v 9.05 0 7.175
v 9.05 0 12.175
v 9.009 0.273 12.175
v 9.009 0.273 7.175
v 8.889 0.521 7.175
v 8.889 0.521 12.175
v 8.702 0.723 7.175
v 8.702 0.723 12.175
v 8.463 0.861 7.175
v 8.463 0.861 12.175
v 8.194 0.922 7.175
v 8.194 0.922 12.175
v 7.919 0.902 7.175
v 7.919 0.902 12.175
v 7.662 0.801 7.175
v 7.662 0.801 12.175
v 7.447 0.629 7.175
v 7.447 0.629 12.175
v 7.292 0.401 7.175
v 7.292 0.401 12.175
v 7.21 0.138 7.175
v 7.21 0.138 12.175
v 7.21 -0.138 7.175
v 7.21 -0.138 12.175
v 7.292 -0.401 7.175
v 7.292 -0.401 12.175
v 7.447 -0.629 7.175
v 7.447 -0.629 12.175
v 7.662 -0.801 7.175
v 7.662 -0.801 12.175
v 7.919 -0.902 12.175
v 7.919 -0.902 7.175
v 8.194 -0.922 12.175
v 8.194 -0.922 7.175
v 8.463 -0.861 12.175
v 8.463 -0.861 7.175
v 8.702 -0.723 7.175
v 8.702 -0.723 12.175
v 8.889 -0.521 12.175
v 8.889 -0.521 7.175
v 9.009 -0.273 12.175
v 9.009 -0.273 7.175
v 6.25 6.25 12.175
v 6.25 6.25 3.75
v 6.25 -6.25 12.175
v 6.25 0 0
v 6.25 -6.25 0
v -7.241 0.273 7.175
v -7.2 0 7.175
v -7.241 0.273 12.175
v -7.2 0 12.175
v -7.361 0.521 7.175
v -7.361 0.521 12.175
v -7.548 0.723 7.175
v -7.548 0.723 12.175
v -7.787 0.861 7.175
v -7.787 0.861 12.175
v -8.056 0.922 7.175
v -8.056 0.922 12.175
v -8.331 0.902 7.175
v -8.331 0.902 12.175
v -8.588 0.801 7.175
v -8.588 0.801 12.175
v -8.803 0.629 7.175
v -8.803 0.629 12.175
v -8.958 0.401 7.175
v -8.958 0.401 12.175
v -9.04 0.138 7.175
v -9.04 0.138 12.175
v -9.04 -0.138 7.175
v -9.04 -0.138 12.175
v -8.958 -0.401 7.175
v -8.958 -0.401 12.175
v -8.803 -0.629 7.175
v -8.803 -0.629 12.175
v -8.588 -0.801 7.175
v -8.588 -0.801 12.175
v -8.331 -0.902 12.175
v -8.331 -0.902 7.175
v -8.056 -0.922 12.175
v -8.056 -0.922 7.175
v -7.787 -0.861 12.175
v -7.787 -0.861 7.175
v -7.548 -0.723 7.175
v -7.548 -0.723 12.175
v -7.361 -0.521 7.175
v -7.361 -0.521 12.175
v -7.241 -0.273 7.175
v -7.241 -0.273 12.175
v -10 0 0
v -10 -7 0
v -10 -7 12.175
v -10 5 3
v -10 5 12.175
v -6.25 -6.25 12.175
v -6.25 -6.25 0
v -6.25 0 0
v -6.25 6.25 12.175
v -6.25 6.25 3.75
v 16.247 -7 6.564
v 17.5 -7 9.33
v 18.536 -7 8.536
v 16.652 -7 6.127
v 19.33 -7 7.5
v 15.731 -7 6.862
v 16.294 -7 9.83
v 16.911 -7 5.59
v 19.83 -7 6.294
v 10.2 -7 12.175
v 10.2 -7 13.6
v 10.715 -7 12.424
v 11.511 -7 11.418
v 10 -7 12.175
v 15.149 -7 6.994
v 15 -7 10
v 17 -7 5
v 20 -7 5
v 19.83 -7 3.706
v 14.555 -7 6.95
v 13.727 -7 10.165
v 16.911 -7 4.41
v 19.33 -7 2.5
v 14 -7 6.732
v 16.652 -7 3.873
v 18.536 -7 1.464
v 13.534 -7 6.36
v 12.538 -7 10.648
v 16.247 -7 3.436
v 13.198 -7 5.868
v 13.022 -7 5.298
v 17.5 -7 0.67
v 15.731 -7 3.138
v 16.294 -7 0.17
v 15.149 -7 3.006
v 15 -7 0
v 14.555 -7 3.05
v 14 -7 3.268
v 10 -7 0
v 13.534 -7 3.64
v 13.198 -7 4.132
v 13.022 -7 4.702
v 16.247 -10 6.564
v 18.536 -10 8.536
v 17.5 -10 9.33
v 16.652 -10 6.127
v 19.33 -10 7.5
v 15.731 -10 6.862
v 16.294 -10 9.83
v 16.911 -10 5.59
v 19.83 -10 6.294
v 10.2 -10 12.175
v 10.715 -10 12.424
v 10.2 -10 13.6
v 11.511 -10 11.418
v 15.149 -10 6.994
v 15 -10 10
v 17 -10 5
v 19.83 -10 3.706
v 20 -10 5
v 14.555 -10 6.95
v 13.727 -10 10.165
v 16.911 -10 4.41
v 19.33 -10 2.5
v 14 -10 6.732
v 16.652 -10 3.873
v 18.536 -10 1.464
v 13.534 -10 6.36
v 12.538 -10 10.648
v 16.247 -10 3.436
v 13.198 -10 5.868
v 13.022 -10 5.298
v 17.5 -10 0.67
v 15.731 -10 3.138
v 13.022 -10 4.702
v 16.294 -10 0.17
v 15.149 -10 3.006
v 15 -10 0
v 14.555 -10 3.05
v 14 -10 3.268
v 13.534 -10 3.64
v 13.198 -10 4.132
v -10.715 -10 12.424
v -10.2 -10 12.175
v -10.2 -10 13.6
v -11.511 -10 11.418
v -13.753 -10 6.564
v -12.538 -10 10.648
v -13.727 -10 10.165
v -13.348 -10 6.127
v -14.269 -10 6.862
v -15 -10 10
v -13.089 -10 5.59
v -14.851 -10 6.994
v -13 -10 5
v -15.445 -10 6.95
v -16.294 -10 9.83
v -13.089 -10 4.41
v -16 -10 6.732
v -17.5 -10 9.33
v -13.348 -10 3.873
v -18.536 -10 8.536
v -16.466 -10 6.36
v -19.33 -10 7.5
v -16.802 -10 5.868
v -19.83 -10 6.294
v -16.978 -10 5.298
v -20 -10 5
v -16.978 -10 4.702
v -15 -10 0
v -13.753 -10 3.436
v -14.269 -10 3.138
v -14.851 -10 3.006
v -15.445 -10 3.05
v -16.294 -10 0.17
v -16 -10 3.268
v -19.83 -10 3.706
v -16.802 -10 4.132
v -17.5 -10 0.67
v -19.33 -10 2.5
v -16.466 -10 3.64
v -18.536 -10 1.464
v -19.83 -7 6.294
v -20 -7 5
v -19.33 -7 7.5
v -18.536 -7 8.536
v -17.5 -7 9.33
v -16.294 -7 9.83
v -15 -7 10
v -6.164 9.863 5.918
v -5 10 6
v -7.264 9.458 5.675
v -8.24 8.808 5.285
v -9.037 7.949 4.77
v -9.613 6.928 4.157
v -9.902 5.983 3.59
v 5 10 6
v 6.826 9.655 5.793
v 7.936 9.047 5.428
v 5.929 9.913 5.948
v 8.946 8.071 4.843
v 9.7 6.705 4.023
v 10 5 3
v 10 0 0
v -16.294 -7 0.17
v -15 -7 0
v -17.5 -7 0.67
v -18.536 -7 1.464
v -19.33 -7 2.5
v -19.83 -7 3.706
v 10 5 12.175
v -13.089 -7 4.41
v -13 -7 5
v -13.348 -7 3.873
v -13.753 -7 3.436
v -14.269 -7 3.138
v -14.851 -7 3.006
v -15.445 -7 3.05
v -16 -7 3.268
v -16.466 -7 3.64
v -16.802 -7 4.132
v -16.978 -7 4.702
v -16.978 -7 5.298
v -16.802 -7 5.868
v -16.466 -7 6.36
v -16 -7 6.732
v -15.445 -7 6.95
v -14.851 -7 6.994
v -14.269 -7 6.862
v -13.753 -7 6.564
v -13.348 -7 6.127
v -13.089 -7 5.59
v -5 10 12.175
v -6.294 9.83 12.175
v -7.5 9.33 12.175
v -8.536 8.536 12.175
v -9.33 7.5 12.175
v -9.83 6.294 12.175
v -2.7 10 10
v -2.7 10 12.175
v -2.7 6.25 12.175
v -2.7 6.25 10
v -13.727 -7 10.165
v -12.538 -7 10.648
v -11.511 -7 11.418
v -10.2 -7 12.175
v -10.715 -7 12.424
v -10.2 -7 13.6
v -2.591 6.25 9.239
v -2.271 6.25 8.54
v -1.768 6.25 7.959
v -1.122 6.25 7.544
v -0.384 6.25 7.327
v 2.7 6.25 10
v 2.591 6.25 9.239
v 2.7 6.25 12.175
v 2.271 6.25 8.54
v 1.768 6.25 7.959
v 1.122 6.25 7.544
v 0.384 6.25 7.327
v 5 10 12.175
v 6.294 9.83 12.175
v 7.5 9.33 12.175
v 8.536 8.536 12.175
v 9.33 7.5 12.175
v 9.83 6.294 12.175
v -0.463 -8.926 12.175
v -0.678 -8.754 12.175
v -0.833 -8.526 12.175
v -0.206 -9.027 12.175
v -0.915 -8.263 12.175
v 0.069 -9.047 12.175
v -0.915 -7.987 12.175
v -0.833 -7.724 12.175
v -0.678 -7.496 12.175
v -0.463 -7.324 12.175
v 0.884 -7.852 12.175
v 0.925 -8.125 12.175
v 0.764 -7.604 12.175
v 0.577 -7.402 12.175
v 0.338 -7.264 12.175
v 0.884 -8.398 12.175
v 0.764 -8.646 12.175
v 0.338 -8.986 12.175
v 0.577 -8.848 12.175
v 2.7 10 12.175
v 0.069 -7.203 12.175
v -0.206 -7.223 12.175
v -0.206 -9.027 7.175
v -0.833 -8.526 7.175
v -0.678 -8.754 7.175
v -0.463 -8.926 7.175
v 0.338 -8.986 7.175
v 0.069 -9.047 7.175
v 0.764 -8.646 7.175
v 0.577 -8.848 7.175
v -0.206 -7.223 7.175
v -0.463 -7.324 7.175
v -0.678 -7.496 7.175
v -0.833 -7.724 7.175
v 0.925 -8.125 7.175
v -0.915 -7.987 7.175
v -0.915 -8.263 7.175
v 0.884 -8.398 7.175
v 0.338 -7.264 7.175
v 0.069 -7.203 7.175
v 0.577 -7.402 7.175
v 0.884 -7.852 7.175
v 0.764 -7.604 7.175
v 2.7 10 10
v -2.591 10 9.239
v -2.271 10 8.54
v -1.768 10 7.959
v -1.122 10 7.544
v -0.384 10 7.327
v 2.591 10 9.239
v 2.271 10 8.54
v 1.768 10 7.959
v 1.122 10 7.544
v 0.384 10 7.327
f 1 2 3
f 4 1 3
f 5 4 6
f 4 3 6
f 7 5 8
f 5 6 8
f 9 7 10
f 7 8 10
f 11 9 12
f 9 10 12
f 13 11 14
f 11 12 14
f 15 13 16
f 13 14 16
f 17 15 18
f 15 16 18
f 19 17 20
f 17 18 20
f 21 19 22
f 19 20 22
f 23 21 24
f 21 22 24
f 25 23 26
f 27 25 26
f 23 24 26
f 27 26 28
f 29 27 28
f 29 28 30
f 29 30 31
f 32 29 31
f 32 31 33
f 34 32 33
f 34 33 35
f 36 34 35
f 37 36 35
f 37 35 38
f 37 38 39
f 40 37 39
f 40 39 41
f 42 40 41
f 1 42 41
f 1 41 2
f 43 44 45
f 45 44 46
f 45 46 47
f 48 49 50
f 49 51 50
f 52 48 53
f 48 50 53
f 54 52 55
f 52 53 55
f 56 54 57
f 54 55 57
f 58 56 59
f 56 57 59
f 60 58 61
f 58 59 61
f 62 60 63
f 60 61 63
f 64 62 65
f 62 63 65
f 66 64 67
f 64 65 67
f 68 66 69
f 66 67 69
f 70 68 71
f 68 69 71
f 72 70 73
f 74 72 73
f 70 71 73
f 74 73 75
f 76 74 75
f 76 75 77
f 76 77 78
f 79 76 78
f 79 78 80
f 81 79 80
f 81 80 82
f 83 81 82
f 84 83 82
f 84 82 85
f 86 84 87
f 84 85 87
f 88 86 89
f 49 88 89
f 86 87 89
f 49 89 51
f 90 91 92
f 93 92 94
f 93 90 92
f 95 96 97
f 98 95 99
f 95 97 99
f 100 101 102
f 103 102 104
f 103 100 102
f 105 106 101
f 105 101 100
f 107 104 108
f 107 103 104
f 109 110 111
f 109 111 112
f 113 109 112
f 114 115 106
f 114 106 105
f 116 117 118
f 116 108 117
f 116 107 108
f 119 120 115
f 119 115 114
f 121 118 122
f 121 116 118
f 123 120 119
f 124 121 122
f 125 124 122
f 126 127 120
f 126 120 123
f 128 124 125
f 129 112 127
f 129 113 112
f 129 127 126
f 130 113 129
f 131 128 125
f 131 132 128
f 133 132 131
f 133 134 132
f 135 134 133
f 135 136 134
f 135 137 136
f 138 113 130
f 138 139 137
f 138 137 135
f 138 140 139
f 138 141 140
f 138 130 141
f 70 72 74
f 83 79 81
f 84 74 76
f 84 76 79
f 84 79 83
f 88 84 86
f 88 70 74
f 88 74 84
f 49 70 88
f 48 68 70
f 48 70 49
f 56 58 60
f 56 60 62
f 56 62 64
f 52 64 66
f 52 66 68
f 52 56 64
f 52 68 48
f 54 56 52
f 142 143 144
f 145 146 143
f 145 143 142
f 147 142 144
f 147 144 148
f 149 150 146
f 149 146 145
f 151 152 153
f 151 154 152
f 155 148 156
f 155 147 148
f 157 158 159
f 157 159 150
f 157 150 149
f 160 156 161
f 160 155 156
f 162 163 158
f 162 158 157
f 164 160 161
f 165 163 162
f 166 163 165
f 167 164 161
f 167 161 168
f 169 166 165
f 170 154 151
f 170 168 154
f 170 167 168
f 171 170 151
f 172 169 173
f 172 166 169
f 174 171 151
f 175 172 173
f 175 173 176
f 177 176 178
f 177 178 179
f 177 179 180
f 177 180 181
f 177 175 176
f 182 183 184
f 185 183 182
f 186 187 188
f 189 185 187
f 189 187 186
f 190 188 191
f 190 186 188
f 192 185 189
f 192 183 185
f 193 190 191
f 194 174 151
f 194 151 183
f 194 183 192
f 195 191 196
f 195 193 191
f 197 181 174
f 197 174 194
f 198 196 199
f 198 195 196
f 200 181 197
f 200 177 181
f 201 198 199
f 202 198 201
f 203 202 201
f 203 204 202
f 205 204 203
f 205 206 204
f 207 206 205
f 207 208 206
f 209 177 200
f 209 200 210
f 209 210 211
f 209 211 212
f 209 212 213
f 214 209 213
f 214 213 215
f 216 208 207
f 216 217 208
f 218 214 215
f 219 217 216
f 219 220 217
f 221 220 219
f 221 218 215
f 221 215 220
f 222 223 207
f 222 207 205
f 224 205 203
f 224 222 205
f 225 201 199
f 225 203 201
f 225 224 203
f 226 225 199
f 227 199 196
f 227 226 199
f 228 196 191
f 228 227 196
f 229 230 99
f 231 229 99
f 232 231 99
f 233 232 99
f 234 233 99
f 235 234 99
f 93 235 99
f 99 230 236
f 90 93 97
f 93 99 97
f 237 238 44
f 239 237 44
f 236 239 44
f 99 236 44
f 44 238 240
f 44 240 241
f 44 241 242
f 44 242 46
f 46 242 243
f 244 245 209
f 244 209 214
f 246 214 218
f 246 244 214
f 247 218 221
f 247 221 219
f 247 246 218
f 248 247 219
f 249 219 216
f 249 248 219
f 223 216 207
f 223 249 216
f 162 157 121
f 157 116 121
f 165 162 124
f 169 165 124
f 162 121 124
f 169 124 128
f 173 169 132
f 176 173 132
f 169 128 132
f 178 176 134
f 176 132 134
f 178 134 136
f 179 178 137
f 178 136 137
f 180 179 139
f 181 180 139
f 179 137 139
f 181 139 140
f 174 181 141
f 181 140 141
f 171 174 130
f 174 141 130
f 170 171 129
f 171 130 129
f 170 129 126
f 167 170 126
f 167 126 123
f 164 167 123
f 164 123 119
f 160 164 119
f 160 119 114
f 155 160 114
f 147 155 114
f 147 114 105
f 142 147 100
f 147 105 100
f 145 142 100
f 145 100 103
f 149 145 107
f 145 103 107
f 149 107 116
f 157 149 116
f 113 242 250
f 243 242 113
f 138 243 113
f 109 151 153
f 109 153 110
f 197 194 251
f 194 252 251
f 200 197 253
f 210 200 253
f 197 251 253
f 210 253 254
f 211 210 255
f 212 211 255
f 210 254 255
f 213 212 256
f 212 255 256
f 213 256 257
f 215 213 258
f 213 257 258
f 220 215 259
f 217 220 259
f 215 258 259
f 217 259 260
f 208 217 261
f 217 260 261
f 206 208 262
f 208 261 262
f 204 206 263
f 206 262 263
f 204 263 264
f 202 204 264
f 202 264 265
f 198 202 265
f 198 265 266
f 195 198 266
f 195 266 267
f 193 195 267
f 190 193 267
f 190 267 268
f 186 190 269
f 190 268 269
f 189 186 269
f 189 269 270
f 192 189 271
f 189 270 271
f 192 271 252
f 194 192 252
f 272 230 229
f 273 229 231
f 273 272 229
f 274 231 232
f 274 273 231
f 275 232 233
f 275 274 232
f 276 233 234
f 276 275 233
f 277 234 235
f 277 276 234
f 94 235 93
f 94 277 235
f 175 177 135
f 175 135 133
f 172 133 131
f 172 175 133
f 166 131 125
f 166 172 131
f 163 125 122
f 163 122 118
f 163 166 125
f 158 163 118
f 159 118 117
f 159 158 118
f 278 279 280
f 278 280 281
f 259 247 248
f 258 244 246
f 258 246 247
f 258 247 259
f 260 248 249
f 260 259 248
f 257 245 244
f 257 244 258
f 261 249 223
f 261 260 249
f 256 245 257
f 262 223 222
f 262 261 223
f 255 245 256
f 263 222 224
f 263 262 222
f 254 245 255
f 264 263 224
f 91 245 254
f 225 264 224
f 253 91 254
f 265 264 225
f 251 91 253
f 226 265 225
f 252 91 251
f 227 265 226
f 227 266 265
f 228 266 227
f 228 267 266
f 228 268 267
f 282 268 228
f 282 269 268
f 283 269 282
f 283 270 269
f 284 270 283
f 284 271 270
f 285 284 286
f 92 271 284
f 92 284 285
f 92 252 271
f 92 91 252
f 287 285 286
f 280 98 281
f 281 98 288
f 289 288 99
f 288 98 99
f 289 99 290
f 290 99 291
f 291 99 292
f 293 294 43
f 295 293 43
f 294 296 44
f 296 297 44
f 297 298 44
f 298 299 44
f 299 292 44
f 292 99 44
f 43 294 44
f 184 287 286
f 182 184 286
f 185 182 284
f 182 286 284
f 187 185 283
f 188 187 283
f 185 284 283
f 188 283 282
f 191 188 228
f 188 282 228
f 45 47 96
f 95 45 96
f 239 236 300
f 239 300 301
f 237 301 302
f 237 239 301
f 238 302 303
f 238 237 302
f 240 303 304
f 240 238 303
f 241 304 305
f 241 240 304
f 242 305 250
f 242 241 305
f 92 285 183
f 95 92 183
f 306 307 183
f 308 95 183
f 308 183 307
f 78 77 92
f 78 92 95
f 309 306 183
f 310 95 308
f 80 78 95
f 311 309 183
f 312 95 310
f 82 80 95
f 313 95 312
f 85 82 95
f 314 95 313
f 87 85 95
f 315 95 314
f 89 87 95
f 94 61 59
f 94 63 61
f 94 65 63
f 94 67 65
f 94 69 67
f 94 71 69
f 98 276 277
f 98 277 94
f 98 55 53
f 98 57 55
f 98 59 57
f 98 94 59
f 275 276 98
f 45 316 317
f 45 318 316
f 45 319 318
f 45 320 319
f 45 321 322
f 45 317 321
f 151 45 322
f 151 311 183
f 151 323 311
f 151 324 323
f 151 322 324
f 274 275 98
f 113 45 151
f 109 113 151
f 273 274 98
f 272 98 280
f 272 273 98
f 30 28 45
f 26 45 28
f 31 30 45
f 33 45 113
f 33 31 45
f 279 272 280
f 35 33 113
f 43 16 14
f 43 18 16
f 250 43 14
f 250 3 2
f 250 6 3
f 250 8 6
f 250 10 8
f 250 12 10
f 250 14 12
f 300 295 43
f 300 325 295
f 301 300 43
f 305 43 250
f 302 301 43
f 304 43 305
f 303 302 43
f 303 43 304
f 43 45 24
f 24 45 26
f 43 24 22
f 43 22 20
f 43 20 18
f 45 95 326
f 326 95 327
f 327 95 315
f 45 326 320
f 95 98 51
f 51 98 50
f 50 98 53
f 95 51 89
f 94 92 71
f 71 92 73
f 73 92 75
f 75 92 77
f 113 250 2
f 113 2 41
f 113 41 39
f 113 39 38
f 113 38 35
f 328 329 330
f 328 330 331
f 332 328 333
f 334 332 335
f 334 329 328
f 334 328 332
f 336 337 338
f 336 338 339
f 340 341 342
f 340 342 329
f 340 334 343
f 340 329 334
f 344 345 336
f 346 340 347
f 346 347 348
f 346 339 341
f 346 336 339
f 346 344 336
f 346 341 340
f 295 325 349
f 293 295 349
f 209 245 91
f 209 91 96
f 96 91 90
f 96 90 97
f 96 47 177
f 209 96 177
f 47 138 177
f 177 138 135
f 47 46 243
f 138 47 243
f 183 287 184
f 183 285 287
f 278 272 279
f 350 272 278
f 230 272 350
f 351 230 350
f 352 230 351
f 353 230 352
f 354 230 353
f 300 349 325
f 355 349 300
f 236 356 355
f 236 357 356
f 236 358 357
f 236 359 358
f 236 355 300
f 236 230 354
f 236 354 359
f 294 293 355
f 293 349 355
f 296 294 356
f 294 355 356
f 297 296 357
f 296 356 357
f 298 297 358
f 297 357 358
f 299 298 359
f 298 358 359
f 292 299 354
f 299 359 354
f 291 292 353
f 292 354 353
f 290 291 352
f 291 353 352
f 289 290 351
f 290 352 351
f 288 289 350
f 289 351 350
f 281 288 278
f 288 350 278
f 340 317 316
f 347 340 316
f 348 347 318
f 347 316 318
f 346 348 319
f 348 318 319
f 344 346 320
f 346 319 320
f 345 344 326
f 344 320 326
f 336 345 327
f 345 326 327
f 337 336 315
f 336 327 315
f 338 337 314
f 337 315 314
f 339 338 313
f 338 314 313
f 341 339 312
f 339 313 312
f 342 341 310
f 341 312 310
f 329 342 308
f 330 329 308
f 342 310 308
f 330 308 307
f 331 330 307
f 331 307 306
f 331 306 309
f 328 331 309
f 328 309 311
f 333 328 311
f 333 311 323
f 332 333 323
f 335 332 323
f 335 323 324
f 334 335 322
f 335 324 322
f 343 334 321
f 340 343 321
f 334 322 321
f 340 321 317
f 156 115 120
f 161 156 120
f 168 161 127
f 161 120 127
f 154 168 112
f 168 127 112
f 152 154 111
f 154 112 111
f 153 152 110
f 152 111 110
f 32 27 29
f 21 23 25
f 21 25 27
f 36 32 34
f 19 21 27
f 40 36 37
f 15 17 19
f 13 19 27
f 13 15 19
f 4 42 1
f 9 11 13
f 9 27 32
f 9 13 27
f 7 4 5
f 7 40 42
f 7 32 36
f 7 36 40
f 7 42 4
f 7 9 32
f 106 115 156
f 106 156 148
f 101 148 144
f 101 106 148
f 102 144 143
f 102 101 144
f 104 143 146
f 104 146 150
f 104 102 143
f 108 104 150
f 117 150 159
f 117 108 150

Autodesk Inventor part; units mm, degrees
ref_plane "YZ Plane" through (0, 0, 0) normal (1, 0, 0) x (0, 1, 0)
ref_plane "XZ Plane" through (0, 0, 0) normal (0, 1, 0) x (-1, 0, 0)
ref_plane "XY Plane" through (0, 0, 0) normal (0, 0, 1) x (1, 0, 0)
sketch "Sketch1" plane through (0, 0, 0) normal (0, 0, 1) x (1, 0, 0)
  line L0 (-6.25, 6.25) -> (6.25, 6.25)
  line L1 (6.25, 6.25) -> (6.25, -6.25)
  line L2 (6.25, -6.25) -> (-6.25, -6.25)
  line L3 (-6.25, -6.25) -> (-6.25, 6.25)
  line L4 (-10, 10) -> (10, 10)
  line L5 (10, 10) -> (10, -10)
  line L6 (10, -10) -> (-10, -10)
  line L7 (-10, -10) -> (-10, 10)
  line L8 (-10, 10) -> (10, -10) construction
  line L9 (10, 10) -> (-10, -10) construction
  dimension "d3" = 20
  dimension "d4" = 20
  dimension "d5" = 3.75
  dimension "d6" = 16.25
  dimension "d7" = 3.75
  dimension "d8" = 16.25
extrude "Extrusion1" add sketch "Sketch1" along normal blind 55
sketch "Sketch2" plane through (0, 0, 55) normal (0, 0, 1) x (1, 0, 0)
  line L0 (10, 10) -> (-10, 10) projected
  line L1 (-10, -10) -> (10, -10)
  line L2 (10, -10) -> (10, 10)
  line L3 (10, 10) -> (-10, 10)
  line L4 (-10, 10) -> (-10, -10)
  line L5 (-10, -10) -> (10, 10) construction
  line L6 (10, -10) -> (-10, 10) construction
  point P0 (0, 0)
extrude "Extrusion2" add sketch "Sketch2" along normal blind 3
sketch "Sketch3" plane through (0, 0, 55) normal (0, 0, -1) x (-1, 0, 0)
  circle A0 centre (0, 0) radius 4
  dimension "d13" = 8
extrude "Extrusion3" add sketch "Sketch3" along normal blind 14
sketch "Sketch4" plane through (10, -10, 0) normal (1, 0, 0) x (0, 0, -1)
  line L0 (0, 0) -> (-58, 0) projected
  line L1 (0, 0) -> (-10, 0)
  line L2 (-10, 0) -> (-10, 3)
  line L3 (-10, 3) -> (0, 3)
  line L4 (0, 3) -> (0, 0)
  line L5 (-58, 0) -> (-58, 20) projected
  line L6 (-58, 0) -> (-48, 0)
  line L7 (-48, 0) -> (-48, 3)
  line L8 (-48, 3) -> (-58, 3)
  line L9 (-58, 3) -> (-58, 0)
  point P0 (0, 10)
  dimension "d16" = 10
  dimension "d17" = 3
  dimension "d18" = 10
  dimension "d19" = 3
extrude "Extrusion4" add sketch "Sketch4" along normal blind 10
sketch "Sketch5" plane through (-10, -10, 0) normal (-1, 0, 0) x (0, 0, 1)
  line L0 (0, 0) -> (0, 20) projected
  line L1 (0, 3) -> (10, 3) projected
  line L2 (0, 0) -> (10, 0)
  line L3 (10, 0) -> (10, 3)
  line L4 (10, 3) -> (0, 3)
  line L5 (0, 3) -> (0, 0)
  line L6 (58, 20) -> (58, 0) projected
  line L7 (58, 0) -> (48, 0)
  line L8 (48, 0) -> (48, 3)
  line L9 (48, 3) -> (58, 3)
  line L10 (58, 3) -> (58, 0)
  point P0 (0, 10)
  dimension "d22" = 10
  dimension "d23" = 3
  dimension "d24" = 10
  dimension "d25" = 3
extrude "Extrusion5" add sketch "Sketch5" along normal blind 10
fillet "Fillet1" radius 5 12 edges at (-20, -8.5, 10) (-20, -8.5, 0) (-10, -8.5, 10) (-10, -8.5, 48) (-20, -8.5, 48) (-20, -8.5, 58) (20, -8.5, 0) (10, -8.5, 10) (20, -8.5, 10) (10, -8.5, 48) (20, -8.5, 48) (20, -8.5, 58)
sketch "Sketch6" plane through (10, -7, 15) normal (0, 1, 0) x (1, 0, 0)
  arc A0 (-25, 15) -> (-25, 5) centre (-25, 10) ccw projected
  circle A1 centre (-25, 10) radius 2
  arc A2 (5, 5) -> (5, 15) centre (5, 10) ccw projected
  circle A3 centre (5, 10) radius 2
  arc A4 (-25, -33) -> (-25, -43) centre (-25, -38) ccw projected
  circle A5 centre (-25, -38) radius 2
  arc A6 (5, -43) -> (5, -33) centre (5, -38) ccw projected
  circle A7 centre (5, -38) radius 2
  point P0 (-10, 15)
  dimension "d29" = 4
  dimension "d30" = 4
  dimension "d31" = 4
extrude "Extrusion6" cut sketch "Sketch6" against normal blind 10
fillet "Fillet2" radius 5 2 edges at (-10, 10, 29) (10, 10, 29)
sketch "Sketch7" plane through (-5, 10, 0) normal (0, 1, 0) x (1, 0, 0)
  arc A0 (7.7, -10) -> (2.3, -10) centre (5, -10) ccw
  line L0 (0, -58) -> (0, 0) projected
  arc A1 (2.3, -14.35) -> (7.7, -14.35) centre (5, -14.35) ccw
  line L1 (2.3, -14.35) -> (2.3, -10)
  line L2 (7.7, -14.35) -> (7.7, -10)
  point P0 (5, 0)
  dimension "d35" = 5.4
  dimension "d36" = 5
  dimension "d37" = 10
  dimension "d38" = 5.4
  dimension "d39" = 4.35
  dimension "d40" = 5
extrude "Extrusion7" cut sketch "Sketch7" against normal blind 10
sketch "Sketch8" plane through (-5, 10, 0) normal (0, 1, 0) x (1, 0, 0)
  line L0 (2.3, -10) -> (2.3, -14.35) projected
  line L1 (2.3, -12.175) -> (-5, -12.175)
  line L2 (-5, 0) -> (-5, -58) projected
  line L3 (-5, -15) -> (-5, -43) projected
  line L4 (-5, -12.175) -> (-5, -43)
  line L5 (-5, -43) -> (-15.8375, -43)
  line L6 (-15.8375, -43) -> (-15.3443, -61.3042)
  line L7 (-15.3443, -61.3042) -> (28.3034, -61.3042)
  line L8 (28.3034, -61.3042) -> (28.3034, -43)
  line L9 (15, -15) -> (15, -43) projected
  line L10 (28.3034, -43) -> (15, -43)
  line L11 (15, -43) -> (15, -12.175)
  line L12 (15, -12.175) -> (2.3, -12.175)
  point P0 (5, 0)
  dimension "d43" = 1.543
  dimension "d44" = 13.3034
  dimension "d45" = 18.3042
  dimension "d46" = 31.5804
extrude "Extrusion8" cut sketch "Sketch8" against normal blind 20
sketch "Sketch9" plane through (-5, 10, 12.175) normal (0, 0, 1) x (1, 0, 0)
  circle A0 centre (5, -18.125) radius 0.925
  circle A1 centre (13.125, -10) radius 0.925
  circle A2 centre (-3.125, -10) radius 0.925
  line L0 (-1.25, -3.75) -> (-1.25, -16.25) projected
  line L1 (11.25, -16.25) -> (11.25, -3.75) projected
  line L2 (-1.25, -16.25) -> (11.25, -16.25) projected
  point P0 (5, -10)
  dimension "d49" = 1.85
  dimension "d50" = 1.85
  dimension "d51" = 1.85
  dimension "d52" = 1.875
  dimension "d53" = 1.875
  dimension "d54" = 1.875
  dimension "d55" = 0
  dimension "d56" = 0
  dimension "d57" = 0
extrude "Extrusion9" cut sketch "Sketch9" against normal blind 5
sketch "Sketch10" plane through (-5, 10, 12.175) normal (0, 0, 1) x (1, 0, 0)
  line L0 (20, -20) -> (-10, -20) projected
  line L1 (15.2, 0) -> (-5.2, 0)
  line L2 (-5.2, 0) -> (-5.2, -20)
  line L3 (-5.2, -20) -> (15.2, -20)
  line L4 (15.2, -20) -> (15.2, 0)
  line L5 (15.2, 0) -> (-5.2, -20) construction
  line L6 (-5.2, 0) -> (15.2, -20) construction
  point P0 (5, -10)
  dimension "d60" = 20.4
extrude "Extrusion10" cut sketch "Sketch10" along normal blind 10
sketch "Sketch12" plane through (10, -7, 0) normal (1, 0, 0) x (0, 0, -1)
  line L0 (0, 17) -> (0, 12) projected
  line L1 (0, 17) -> (-6, 17)
  line L2 (-12.175, 17) -> (0, 17) projected
  line L3 (0, 17) -> (0, 7)
  line L4 (0, 13.25) -> (0, 0.75) projected
  line L5 (-6, 17) -> (0, 7)
  dimension "d68" = 6
  dimension "d69" = 10
extrude "Extrusion12" cut sketch "Sketch12" against normal blind 20
properties part number "15 slot pinhuls klijn"
